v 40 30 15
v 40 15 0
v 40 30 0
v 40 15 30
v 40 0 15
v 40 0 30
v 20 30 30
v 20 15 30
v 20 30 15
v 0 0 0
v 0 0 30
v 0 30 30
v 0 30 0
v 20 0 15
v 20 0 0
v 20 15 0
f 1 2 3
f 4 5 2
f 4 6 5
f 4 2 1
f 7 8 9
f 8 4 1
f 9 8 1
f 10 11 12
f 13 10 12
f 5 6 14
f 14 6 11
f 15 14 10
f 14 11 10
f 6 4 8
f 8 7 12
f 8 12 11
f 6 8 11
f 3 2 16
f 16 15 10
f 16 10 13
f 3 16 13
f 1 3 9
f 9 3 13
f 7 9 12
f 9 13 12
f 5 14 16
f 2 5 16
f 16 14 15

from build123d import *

# Parameters (mm, degrees)
F0_W     = 15
F0_H     = 15
F1_DEPTH = 20
F2_DEPTH = 40
F4_DEPTH = 20
F6_DEPTH = 20


with BuildPart() as f1:
    # F0 (on Right) → F1 (new body)
    with BuildSketch(Plane.YZ):
        with Locations((7.5, 7.5)):
            Rectangle(F0_W, F0_H)
        with Locations((22.5, 7.5)):
            Rectangle(F0_W, F0_H)
        with Locations((7.5, 22.5)):
            Rectangle(F0_W, F0_H)
        with Locations((22.5, 22.5)):
            Rectangle(F0_W, F0_H)
    extrude(amount=F1_DEPTH)

    # F0 (on Right) → F2 (join)
    with BuildSketch(Plane.YZ):
        with Locations((22.5, 7.5)):
            Rectangle(F0_W, F0_H)
        with Locations((22.5, 22.5)):
            Rectangle(F0_W, F0_H)
        with Locations((7.5, 22.5)):
            Rectangle(F0_W, F0_H)
    extrude(amount=F2_DEPTH)

    # F3 (on face) → F4 (cut)
    with BuildSketch(Plane.YZ.offset(40)):
        Polygon((30, 30), (15, 30), (30, 15), align=None)
    extrude(amount=-F4_DEPTH, mode=Mode.SUBTRACT)

    # F5 (on face) → F6 (join)
    with BuildSketch(Plane.YZ.offset(20)):
        Polygon((15, 15), (0, 15), (15, 0), align=None)
    extrude(amount=F6_DEPTH)


solid = f1.part
